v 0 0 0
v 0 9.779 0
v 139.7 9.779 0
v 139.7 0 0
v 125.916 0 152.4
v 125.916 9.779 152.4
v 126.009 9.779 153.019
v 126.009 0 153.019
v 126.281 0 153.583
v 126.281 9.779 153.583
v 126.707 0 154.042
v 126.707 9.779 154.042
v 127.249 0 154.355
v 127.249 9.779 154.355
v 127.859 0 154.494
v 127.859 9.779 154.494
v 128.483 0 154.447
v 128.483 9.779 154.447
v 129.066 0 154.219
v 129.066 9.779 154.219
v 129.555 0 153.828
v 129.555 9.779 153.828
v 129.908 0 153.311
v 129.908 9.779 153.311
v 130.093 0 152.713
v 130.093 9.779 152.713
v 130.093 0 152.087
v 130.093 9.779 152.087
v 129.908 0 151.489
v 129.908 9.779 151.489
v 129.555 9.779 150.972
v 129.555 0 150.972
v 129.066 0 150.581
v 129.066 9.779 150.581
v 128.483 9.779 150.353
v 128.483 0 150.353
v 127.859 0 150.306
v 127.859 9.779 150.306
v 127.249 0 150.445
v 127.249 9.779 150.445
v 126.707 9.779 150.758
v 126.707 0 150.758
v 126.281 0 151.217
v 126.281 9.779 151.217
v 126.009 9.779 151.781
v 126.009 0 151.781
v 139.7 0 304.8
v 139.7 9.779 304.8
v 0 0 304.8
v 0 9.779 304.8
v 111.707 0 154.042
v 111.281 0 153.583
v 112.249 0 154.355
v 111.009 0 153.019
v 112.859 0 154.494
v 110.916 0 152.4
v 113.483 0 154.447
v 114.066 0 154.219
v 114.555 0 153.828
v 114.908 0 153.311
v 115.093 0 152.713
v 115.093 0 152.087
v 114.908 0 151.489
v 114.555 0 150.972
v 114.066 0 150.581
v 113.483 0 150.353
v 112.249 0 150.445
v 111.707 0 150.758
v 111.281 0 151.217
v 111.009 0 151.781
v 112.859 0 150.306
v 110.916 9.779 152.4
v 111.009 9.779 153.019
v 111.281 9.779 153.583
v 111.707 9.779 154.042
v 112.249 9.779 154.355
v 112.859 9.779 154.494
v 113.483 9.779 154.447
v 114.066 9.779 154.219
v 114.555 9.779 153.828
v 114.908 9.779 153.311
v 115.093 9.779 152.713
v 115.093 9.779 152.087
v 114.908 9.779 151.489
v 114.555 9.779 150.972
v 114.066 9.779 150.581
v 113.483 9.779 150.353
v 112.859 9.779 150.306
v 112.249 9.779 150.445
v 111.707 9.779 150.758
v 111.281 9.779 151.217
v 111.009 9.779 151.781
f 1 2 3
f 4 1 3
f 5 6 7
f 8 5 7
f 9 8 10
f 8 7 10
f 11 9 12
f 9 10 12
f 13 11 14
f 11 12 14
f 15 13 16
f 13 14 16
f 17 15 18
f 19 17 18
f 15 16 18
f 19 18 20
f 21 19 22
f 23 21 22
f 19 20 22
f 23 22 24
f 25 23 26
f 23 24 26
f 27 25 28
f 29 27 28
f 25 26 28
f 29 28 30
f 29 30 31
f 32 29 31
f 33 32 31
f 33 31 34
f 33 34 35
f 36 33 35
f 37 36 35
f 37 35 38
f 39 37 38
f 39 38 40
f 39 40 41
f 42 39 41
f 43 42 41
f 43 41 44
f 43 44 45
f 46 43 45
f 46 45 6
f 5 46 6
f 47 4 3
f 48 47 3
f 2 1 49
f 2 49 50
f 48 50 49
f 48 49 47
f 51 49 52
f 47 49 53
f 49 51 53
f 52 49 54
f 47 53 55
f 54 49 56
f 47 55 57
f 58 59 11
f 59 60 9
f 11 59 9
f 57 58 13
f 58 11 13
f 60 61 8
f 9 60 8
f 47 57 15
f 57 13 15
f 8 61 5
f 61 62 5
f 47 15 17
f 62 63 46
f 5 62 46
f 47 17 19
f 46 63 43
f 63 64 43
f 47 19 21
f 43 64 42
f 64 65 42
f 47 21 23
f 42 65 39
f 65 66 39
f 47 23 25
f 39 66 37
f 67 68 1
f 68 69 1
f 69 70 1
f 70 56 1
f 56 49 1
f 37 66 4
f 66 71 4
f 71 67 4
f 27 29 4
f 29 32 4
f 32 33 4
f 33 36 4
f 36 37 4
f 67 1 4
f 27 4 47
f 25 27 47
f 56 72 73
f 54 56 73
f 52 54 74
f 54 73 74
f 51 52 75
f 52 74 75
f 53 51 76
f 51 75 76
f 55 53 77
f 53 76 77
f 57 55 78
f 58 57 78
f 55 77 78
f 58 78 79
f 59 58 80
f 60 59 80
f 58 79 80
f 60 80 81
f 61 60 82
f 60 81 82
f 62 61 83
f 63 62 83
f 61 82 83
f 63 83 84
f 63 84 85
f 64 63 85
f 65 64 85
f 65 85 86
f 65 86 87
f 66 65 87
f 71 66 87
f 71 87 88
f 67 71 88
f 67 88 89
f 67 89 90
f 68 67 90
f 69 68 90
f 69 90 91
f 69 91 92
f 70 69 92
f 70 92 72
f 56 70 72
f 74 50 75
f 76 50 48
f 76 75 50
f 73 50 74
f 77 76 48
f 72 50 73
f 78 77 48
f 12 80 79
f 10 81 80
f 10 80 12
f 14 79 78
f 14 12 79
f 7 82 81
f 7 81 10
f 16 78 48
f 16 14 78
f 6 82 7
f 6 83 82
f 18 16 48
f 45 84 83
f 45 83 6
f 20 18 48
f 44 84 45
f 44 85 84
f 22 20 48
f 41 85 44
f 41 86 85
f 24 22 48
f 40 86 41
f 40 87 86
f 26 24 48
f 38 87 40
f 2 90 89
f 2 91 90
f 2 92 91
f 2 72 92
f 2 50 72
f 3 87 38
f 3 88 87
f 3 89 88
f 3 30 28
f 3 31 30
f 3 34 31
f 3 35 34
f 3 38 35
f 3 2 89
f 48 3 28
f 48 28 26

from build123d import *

# Parameters (mm, degrees)
SKETCH1_W           = 139.7
SKETCH1_H           = 9.779
BOSS_EXTRUDE1_DEPTH = 304.8
CUT_EXTRUDE2_DEPTH  = 336.432197085


with BuildPart() as part:
    # Sketch1 → Boss-Extrude1 (new body)
    with BuildSketch(Plane.XY):
        with Locations((69.85, 4.8895)):
            Rectangle(SKETCH1_W, SKETCH1_H)
    extrude(amount=BOSS_EXTRUDE1_DEPTH)

    # Sketch2 → Cut-Extrude2 (cut, through all)
    with BuildSketch(Plane(origin=(0, 9.779, 0), x_dir=(1, 0, 0), z_dir=(0, 1, 0))):
        with BuildLine():
            ThreePointArc((115.115999991, -152.4), (113.016, -150.300000009), (110.916000009, -152.4))
            Line((110.916000009, -152.4), (115.115999991, -152.4))
        make_face()
        with BuildLine():
            Line((115.115999991, -152.4), (110.916000009, -152.4))
            ThreePointArc((110.916000009, -152.4), (113.016, -154.499999991), (115.115999991, -152.4))
        make_face()
        with BuildLine():
            ThreePointArc((130.115999991, -152.4), (128.016, -150.300000009), (125.916000009, -152.4))
            Line((125.916000009, -152.4), (130.115999991, -152.4))
        make_face()
        with BuildLine():
            Line((130.115999991, -152.4), (125.916000009, -152.4))
            ThreePointArc((125.916000009, -152.4), (128.016, -154.499999991), (130.115999991, -152.4))
        make_face()
    extrude(amount=-CUT_EXTRUDE2_DEPTH, mode=Mode.SUBTRACT)


solid = part.part
